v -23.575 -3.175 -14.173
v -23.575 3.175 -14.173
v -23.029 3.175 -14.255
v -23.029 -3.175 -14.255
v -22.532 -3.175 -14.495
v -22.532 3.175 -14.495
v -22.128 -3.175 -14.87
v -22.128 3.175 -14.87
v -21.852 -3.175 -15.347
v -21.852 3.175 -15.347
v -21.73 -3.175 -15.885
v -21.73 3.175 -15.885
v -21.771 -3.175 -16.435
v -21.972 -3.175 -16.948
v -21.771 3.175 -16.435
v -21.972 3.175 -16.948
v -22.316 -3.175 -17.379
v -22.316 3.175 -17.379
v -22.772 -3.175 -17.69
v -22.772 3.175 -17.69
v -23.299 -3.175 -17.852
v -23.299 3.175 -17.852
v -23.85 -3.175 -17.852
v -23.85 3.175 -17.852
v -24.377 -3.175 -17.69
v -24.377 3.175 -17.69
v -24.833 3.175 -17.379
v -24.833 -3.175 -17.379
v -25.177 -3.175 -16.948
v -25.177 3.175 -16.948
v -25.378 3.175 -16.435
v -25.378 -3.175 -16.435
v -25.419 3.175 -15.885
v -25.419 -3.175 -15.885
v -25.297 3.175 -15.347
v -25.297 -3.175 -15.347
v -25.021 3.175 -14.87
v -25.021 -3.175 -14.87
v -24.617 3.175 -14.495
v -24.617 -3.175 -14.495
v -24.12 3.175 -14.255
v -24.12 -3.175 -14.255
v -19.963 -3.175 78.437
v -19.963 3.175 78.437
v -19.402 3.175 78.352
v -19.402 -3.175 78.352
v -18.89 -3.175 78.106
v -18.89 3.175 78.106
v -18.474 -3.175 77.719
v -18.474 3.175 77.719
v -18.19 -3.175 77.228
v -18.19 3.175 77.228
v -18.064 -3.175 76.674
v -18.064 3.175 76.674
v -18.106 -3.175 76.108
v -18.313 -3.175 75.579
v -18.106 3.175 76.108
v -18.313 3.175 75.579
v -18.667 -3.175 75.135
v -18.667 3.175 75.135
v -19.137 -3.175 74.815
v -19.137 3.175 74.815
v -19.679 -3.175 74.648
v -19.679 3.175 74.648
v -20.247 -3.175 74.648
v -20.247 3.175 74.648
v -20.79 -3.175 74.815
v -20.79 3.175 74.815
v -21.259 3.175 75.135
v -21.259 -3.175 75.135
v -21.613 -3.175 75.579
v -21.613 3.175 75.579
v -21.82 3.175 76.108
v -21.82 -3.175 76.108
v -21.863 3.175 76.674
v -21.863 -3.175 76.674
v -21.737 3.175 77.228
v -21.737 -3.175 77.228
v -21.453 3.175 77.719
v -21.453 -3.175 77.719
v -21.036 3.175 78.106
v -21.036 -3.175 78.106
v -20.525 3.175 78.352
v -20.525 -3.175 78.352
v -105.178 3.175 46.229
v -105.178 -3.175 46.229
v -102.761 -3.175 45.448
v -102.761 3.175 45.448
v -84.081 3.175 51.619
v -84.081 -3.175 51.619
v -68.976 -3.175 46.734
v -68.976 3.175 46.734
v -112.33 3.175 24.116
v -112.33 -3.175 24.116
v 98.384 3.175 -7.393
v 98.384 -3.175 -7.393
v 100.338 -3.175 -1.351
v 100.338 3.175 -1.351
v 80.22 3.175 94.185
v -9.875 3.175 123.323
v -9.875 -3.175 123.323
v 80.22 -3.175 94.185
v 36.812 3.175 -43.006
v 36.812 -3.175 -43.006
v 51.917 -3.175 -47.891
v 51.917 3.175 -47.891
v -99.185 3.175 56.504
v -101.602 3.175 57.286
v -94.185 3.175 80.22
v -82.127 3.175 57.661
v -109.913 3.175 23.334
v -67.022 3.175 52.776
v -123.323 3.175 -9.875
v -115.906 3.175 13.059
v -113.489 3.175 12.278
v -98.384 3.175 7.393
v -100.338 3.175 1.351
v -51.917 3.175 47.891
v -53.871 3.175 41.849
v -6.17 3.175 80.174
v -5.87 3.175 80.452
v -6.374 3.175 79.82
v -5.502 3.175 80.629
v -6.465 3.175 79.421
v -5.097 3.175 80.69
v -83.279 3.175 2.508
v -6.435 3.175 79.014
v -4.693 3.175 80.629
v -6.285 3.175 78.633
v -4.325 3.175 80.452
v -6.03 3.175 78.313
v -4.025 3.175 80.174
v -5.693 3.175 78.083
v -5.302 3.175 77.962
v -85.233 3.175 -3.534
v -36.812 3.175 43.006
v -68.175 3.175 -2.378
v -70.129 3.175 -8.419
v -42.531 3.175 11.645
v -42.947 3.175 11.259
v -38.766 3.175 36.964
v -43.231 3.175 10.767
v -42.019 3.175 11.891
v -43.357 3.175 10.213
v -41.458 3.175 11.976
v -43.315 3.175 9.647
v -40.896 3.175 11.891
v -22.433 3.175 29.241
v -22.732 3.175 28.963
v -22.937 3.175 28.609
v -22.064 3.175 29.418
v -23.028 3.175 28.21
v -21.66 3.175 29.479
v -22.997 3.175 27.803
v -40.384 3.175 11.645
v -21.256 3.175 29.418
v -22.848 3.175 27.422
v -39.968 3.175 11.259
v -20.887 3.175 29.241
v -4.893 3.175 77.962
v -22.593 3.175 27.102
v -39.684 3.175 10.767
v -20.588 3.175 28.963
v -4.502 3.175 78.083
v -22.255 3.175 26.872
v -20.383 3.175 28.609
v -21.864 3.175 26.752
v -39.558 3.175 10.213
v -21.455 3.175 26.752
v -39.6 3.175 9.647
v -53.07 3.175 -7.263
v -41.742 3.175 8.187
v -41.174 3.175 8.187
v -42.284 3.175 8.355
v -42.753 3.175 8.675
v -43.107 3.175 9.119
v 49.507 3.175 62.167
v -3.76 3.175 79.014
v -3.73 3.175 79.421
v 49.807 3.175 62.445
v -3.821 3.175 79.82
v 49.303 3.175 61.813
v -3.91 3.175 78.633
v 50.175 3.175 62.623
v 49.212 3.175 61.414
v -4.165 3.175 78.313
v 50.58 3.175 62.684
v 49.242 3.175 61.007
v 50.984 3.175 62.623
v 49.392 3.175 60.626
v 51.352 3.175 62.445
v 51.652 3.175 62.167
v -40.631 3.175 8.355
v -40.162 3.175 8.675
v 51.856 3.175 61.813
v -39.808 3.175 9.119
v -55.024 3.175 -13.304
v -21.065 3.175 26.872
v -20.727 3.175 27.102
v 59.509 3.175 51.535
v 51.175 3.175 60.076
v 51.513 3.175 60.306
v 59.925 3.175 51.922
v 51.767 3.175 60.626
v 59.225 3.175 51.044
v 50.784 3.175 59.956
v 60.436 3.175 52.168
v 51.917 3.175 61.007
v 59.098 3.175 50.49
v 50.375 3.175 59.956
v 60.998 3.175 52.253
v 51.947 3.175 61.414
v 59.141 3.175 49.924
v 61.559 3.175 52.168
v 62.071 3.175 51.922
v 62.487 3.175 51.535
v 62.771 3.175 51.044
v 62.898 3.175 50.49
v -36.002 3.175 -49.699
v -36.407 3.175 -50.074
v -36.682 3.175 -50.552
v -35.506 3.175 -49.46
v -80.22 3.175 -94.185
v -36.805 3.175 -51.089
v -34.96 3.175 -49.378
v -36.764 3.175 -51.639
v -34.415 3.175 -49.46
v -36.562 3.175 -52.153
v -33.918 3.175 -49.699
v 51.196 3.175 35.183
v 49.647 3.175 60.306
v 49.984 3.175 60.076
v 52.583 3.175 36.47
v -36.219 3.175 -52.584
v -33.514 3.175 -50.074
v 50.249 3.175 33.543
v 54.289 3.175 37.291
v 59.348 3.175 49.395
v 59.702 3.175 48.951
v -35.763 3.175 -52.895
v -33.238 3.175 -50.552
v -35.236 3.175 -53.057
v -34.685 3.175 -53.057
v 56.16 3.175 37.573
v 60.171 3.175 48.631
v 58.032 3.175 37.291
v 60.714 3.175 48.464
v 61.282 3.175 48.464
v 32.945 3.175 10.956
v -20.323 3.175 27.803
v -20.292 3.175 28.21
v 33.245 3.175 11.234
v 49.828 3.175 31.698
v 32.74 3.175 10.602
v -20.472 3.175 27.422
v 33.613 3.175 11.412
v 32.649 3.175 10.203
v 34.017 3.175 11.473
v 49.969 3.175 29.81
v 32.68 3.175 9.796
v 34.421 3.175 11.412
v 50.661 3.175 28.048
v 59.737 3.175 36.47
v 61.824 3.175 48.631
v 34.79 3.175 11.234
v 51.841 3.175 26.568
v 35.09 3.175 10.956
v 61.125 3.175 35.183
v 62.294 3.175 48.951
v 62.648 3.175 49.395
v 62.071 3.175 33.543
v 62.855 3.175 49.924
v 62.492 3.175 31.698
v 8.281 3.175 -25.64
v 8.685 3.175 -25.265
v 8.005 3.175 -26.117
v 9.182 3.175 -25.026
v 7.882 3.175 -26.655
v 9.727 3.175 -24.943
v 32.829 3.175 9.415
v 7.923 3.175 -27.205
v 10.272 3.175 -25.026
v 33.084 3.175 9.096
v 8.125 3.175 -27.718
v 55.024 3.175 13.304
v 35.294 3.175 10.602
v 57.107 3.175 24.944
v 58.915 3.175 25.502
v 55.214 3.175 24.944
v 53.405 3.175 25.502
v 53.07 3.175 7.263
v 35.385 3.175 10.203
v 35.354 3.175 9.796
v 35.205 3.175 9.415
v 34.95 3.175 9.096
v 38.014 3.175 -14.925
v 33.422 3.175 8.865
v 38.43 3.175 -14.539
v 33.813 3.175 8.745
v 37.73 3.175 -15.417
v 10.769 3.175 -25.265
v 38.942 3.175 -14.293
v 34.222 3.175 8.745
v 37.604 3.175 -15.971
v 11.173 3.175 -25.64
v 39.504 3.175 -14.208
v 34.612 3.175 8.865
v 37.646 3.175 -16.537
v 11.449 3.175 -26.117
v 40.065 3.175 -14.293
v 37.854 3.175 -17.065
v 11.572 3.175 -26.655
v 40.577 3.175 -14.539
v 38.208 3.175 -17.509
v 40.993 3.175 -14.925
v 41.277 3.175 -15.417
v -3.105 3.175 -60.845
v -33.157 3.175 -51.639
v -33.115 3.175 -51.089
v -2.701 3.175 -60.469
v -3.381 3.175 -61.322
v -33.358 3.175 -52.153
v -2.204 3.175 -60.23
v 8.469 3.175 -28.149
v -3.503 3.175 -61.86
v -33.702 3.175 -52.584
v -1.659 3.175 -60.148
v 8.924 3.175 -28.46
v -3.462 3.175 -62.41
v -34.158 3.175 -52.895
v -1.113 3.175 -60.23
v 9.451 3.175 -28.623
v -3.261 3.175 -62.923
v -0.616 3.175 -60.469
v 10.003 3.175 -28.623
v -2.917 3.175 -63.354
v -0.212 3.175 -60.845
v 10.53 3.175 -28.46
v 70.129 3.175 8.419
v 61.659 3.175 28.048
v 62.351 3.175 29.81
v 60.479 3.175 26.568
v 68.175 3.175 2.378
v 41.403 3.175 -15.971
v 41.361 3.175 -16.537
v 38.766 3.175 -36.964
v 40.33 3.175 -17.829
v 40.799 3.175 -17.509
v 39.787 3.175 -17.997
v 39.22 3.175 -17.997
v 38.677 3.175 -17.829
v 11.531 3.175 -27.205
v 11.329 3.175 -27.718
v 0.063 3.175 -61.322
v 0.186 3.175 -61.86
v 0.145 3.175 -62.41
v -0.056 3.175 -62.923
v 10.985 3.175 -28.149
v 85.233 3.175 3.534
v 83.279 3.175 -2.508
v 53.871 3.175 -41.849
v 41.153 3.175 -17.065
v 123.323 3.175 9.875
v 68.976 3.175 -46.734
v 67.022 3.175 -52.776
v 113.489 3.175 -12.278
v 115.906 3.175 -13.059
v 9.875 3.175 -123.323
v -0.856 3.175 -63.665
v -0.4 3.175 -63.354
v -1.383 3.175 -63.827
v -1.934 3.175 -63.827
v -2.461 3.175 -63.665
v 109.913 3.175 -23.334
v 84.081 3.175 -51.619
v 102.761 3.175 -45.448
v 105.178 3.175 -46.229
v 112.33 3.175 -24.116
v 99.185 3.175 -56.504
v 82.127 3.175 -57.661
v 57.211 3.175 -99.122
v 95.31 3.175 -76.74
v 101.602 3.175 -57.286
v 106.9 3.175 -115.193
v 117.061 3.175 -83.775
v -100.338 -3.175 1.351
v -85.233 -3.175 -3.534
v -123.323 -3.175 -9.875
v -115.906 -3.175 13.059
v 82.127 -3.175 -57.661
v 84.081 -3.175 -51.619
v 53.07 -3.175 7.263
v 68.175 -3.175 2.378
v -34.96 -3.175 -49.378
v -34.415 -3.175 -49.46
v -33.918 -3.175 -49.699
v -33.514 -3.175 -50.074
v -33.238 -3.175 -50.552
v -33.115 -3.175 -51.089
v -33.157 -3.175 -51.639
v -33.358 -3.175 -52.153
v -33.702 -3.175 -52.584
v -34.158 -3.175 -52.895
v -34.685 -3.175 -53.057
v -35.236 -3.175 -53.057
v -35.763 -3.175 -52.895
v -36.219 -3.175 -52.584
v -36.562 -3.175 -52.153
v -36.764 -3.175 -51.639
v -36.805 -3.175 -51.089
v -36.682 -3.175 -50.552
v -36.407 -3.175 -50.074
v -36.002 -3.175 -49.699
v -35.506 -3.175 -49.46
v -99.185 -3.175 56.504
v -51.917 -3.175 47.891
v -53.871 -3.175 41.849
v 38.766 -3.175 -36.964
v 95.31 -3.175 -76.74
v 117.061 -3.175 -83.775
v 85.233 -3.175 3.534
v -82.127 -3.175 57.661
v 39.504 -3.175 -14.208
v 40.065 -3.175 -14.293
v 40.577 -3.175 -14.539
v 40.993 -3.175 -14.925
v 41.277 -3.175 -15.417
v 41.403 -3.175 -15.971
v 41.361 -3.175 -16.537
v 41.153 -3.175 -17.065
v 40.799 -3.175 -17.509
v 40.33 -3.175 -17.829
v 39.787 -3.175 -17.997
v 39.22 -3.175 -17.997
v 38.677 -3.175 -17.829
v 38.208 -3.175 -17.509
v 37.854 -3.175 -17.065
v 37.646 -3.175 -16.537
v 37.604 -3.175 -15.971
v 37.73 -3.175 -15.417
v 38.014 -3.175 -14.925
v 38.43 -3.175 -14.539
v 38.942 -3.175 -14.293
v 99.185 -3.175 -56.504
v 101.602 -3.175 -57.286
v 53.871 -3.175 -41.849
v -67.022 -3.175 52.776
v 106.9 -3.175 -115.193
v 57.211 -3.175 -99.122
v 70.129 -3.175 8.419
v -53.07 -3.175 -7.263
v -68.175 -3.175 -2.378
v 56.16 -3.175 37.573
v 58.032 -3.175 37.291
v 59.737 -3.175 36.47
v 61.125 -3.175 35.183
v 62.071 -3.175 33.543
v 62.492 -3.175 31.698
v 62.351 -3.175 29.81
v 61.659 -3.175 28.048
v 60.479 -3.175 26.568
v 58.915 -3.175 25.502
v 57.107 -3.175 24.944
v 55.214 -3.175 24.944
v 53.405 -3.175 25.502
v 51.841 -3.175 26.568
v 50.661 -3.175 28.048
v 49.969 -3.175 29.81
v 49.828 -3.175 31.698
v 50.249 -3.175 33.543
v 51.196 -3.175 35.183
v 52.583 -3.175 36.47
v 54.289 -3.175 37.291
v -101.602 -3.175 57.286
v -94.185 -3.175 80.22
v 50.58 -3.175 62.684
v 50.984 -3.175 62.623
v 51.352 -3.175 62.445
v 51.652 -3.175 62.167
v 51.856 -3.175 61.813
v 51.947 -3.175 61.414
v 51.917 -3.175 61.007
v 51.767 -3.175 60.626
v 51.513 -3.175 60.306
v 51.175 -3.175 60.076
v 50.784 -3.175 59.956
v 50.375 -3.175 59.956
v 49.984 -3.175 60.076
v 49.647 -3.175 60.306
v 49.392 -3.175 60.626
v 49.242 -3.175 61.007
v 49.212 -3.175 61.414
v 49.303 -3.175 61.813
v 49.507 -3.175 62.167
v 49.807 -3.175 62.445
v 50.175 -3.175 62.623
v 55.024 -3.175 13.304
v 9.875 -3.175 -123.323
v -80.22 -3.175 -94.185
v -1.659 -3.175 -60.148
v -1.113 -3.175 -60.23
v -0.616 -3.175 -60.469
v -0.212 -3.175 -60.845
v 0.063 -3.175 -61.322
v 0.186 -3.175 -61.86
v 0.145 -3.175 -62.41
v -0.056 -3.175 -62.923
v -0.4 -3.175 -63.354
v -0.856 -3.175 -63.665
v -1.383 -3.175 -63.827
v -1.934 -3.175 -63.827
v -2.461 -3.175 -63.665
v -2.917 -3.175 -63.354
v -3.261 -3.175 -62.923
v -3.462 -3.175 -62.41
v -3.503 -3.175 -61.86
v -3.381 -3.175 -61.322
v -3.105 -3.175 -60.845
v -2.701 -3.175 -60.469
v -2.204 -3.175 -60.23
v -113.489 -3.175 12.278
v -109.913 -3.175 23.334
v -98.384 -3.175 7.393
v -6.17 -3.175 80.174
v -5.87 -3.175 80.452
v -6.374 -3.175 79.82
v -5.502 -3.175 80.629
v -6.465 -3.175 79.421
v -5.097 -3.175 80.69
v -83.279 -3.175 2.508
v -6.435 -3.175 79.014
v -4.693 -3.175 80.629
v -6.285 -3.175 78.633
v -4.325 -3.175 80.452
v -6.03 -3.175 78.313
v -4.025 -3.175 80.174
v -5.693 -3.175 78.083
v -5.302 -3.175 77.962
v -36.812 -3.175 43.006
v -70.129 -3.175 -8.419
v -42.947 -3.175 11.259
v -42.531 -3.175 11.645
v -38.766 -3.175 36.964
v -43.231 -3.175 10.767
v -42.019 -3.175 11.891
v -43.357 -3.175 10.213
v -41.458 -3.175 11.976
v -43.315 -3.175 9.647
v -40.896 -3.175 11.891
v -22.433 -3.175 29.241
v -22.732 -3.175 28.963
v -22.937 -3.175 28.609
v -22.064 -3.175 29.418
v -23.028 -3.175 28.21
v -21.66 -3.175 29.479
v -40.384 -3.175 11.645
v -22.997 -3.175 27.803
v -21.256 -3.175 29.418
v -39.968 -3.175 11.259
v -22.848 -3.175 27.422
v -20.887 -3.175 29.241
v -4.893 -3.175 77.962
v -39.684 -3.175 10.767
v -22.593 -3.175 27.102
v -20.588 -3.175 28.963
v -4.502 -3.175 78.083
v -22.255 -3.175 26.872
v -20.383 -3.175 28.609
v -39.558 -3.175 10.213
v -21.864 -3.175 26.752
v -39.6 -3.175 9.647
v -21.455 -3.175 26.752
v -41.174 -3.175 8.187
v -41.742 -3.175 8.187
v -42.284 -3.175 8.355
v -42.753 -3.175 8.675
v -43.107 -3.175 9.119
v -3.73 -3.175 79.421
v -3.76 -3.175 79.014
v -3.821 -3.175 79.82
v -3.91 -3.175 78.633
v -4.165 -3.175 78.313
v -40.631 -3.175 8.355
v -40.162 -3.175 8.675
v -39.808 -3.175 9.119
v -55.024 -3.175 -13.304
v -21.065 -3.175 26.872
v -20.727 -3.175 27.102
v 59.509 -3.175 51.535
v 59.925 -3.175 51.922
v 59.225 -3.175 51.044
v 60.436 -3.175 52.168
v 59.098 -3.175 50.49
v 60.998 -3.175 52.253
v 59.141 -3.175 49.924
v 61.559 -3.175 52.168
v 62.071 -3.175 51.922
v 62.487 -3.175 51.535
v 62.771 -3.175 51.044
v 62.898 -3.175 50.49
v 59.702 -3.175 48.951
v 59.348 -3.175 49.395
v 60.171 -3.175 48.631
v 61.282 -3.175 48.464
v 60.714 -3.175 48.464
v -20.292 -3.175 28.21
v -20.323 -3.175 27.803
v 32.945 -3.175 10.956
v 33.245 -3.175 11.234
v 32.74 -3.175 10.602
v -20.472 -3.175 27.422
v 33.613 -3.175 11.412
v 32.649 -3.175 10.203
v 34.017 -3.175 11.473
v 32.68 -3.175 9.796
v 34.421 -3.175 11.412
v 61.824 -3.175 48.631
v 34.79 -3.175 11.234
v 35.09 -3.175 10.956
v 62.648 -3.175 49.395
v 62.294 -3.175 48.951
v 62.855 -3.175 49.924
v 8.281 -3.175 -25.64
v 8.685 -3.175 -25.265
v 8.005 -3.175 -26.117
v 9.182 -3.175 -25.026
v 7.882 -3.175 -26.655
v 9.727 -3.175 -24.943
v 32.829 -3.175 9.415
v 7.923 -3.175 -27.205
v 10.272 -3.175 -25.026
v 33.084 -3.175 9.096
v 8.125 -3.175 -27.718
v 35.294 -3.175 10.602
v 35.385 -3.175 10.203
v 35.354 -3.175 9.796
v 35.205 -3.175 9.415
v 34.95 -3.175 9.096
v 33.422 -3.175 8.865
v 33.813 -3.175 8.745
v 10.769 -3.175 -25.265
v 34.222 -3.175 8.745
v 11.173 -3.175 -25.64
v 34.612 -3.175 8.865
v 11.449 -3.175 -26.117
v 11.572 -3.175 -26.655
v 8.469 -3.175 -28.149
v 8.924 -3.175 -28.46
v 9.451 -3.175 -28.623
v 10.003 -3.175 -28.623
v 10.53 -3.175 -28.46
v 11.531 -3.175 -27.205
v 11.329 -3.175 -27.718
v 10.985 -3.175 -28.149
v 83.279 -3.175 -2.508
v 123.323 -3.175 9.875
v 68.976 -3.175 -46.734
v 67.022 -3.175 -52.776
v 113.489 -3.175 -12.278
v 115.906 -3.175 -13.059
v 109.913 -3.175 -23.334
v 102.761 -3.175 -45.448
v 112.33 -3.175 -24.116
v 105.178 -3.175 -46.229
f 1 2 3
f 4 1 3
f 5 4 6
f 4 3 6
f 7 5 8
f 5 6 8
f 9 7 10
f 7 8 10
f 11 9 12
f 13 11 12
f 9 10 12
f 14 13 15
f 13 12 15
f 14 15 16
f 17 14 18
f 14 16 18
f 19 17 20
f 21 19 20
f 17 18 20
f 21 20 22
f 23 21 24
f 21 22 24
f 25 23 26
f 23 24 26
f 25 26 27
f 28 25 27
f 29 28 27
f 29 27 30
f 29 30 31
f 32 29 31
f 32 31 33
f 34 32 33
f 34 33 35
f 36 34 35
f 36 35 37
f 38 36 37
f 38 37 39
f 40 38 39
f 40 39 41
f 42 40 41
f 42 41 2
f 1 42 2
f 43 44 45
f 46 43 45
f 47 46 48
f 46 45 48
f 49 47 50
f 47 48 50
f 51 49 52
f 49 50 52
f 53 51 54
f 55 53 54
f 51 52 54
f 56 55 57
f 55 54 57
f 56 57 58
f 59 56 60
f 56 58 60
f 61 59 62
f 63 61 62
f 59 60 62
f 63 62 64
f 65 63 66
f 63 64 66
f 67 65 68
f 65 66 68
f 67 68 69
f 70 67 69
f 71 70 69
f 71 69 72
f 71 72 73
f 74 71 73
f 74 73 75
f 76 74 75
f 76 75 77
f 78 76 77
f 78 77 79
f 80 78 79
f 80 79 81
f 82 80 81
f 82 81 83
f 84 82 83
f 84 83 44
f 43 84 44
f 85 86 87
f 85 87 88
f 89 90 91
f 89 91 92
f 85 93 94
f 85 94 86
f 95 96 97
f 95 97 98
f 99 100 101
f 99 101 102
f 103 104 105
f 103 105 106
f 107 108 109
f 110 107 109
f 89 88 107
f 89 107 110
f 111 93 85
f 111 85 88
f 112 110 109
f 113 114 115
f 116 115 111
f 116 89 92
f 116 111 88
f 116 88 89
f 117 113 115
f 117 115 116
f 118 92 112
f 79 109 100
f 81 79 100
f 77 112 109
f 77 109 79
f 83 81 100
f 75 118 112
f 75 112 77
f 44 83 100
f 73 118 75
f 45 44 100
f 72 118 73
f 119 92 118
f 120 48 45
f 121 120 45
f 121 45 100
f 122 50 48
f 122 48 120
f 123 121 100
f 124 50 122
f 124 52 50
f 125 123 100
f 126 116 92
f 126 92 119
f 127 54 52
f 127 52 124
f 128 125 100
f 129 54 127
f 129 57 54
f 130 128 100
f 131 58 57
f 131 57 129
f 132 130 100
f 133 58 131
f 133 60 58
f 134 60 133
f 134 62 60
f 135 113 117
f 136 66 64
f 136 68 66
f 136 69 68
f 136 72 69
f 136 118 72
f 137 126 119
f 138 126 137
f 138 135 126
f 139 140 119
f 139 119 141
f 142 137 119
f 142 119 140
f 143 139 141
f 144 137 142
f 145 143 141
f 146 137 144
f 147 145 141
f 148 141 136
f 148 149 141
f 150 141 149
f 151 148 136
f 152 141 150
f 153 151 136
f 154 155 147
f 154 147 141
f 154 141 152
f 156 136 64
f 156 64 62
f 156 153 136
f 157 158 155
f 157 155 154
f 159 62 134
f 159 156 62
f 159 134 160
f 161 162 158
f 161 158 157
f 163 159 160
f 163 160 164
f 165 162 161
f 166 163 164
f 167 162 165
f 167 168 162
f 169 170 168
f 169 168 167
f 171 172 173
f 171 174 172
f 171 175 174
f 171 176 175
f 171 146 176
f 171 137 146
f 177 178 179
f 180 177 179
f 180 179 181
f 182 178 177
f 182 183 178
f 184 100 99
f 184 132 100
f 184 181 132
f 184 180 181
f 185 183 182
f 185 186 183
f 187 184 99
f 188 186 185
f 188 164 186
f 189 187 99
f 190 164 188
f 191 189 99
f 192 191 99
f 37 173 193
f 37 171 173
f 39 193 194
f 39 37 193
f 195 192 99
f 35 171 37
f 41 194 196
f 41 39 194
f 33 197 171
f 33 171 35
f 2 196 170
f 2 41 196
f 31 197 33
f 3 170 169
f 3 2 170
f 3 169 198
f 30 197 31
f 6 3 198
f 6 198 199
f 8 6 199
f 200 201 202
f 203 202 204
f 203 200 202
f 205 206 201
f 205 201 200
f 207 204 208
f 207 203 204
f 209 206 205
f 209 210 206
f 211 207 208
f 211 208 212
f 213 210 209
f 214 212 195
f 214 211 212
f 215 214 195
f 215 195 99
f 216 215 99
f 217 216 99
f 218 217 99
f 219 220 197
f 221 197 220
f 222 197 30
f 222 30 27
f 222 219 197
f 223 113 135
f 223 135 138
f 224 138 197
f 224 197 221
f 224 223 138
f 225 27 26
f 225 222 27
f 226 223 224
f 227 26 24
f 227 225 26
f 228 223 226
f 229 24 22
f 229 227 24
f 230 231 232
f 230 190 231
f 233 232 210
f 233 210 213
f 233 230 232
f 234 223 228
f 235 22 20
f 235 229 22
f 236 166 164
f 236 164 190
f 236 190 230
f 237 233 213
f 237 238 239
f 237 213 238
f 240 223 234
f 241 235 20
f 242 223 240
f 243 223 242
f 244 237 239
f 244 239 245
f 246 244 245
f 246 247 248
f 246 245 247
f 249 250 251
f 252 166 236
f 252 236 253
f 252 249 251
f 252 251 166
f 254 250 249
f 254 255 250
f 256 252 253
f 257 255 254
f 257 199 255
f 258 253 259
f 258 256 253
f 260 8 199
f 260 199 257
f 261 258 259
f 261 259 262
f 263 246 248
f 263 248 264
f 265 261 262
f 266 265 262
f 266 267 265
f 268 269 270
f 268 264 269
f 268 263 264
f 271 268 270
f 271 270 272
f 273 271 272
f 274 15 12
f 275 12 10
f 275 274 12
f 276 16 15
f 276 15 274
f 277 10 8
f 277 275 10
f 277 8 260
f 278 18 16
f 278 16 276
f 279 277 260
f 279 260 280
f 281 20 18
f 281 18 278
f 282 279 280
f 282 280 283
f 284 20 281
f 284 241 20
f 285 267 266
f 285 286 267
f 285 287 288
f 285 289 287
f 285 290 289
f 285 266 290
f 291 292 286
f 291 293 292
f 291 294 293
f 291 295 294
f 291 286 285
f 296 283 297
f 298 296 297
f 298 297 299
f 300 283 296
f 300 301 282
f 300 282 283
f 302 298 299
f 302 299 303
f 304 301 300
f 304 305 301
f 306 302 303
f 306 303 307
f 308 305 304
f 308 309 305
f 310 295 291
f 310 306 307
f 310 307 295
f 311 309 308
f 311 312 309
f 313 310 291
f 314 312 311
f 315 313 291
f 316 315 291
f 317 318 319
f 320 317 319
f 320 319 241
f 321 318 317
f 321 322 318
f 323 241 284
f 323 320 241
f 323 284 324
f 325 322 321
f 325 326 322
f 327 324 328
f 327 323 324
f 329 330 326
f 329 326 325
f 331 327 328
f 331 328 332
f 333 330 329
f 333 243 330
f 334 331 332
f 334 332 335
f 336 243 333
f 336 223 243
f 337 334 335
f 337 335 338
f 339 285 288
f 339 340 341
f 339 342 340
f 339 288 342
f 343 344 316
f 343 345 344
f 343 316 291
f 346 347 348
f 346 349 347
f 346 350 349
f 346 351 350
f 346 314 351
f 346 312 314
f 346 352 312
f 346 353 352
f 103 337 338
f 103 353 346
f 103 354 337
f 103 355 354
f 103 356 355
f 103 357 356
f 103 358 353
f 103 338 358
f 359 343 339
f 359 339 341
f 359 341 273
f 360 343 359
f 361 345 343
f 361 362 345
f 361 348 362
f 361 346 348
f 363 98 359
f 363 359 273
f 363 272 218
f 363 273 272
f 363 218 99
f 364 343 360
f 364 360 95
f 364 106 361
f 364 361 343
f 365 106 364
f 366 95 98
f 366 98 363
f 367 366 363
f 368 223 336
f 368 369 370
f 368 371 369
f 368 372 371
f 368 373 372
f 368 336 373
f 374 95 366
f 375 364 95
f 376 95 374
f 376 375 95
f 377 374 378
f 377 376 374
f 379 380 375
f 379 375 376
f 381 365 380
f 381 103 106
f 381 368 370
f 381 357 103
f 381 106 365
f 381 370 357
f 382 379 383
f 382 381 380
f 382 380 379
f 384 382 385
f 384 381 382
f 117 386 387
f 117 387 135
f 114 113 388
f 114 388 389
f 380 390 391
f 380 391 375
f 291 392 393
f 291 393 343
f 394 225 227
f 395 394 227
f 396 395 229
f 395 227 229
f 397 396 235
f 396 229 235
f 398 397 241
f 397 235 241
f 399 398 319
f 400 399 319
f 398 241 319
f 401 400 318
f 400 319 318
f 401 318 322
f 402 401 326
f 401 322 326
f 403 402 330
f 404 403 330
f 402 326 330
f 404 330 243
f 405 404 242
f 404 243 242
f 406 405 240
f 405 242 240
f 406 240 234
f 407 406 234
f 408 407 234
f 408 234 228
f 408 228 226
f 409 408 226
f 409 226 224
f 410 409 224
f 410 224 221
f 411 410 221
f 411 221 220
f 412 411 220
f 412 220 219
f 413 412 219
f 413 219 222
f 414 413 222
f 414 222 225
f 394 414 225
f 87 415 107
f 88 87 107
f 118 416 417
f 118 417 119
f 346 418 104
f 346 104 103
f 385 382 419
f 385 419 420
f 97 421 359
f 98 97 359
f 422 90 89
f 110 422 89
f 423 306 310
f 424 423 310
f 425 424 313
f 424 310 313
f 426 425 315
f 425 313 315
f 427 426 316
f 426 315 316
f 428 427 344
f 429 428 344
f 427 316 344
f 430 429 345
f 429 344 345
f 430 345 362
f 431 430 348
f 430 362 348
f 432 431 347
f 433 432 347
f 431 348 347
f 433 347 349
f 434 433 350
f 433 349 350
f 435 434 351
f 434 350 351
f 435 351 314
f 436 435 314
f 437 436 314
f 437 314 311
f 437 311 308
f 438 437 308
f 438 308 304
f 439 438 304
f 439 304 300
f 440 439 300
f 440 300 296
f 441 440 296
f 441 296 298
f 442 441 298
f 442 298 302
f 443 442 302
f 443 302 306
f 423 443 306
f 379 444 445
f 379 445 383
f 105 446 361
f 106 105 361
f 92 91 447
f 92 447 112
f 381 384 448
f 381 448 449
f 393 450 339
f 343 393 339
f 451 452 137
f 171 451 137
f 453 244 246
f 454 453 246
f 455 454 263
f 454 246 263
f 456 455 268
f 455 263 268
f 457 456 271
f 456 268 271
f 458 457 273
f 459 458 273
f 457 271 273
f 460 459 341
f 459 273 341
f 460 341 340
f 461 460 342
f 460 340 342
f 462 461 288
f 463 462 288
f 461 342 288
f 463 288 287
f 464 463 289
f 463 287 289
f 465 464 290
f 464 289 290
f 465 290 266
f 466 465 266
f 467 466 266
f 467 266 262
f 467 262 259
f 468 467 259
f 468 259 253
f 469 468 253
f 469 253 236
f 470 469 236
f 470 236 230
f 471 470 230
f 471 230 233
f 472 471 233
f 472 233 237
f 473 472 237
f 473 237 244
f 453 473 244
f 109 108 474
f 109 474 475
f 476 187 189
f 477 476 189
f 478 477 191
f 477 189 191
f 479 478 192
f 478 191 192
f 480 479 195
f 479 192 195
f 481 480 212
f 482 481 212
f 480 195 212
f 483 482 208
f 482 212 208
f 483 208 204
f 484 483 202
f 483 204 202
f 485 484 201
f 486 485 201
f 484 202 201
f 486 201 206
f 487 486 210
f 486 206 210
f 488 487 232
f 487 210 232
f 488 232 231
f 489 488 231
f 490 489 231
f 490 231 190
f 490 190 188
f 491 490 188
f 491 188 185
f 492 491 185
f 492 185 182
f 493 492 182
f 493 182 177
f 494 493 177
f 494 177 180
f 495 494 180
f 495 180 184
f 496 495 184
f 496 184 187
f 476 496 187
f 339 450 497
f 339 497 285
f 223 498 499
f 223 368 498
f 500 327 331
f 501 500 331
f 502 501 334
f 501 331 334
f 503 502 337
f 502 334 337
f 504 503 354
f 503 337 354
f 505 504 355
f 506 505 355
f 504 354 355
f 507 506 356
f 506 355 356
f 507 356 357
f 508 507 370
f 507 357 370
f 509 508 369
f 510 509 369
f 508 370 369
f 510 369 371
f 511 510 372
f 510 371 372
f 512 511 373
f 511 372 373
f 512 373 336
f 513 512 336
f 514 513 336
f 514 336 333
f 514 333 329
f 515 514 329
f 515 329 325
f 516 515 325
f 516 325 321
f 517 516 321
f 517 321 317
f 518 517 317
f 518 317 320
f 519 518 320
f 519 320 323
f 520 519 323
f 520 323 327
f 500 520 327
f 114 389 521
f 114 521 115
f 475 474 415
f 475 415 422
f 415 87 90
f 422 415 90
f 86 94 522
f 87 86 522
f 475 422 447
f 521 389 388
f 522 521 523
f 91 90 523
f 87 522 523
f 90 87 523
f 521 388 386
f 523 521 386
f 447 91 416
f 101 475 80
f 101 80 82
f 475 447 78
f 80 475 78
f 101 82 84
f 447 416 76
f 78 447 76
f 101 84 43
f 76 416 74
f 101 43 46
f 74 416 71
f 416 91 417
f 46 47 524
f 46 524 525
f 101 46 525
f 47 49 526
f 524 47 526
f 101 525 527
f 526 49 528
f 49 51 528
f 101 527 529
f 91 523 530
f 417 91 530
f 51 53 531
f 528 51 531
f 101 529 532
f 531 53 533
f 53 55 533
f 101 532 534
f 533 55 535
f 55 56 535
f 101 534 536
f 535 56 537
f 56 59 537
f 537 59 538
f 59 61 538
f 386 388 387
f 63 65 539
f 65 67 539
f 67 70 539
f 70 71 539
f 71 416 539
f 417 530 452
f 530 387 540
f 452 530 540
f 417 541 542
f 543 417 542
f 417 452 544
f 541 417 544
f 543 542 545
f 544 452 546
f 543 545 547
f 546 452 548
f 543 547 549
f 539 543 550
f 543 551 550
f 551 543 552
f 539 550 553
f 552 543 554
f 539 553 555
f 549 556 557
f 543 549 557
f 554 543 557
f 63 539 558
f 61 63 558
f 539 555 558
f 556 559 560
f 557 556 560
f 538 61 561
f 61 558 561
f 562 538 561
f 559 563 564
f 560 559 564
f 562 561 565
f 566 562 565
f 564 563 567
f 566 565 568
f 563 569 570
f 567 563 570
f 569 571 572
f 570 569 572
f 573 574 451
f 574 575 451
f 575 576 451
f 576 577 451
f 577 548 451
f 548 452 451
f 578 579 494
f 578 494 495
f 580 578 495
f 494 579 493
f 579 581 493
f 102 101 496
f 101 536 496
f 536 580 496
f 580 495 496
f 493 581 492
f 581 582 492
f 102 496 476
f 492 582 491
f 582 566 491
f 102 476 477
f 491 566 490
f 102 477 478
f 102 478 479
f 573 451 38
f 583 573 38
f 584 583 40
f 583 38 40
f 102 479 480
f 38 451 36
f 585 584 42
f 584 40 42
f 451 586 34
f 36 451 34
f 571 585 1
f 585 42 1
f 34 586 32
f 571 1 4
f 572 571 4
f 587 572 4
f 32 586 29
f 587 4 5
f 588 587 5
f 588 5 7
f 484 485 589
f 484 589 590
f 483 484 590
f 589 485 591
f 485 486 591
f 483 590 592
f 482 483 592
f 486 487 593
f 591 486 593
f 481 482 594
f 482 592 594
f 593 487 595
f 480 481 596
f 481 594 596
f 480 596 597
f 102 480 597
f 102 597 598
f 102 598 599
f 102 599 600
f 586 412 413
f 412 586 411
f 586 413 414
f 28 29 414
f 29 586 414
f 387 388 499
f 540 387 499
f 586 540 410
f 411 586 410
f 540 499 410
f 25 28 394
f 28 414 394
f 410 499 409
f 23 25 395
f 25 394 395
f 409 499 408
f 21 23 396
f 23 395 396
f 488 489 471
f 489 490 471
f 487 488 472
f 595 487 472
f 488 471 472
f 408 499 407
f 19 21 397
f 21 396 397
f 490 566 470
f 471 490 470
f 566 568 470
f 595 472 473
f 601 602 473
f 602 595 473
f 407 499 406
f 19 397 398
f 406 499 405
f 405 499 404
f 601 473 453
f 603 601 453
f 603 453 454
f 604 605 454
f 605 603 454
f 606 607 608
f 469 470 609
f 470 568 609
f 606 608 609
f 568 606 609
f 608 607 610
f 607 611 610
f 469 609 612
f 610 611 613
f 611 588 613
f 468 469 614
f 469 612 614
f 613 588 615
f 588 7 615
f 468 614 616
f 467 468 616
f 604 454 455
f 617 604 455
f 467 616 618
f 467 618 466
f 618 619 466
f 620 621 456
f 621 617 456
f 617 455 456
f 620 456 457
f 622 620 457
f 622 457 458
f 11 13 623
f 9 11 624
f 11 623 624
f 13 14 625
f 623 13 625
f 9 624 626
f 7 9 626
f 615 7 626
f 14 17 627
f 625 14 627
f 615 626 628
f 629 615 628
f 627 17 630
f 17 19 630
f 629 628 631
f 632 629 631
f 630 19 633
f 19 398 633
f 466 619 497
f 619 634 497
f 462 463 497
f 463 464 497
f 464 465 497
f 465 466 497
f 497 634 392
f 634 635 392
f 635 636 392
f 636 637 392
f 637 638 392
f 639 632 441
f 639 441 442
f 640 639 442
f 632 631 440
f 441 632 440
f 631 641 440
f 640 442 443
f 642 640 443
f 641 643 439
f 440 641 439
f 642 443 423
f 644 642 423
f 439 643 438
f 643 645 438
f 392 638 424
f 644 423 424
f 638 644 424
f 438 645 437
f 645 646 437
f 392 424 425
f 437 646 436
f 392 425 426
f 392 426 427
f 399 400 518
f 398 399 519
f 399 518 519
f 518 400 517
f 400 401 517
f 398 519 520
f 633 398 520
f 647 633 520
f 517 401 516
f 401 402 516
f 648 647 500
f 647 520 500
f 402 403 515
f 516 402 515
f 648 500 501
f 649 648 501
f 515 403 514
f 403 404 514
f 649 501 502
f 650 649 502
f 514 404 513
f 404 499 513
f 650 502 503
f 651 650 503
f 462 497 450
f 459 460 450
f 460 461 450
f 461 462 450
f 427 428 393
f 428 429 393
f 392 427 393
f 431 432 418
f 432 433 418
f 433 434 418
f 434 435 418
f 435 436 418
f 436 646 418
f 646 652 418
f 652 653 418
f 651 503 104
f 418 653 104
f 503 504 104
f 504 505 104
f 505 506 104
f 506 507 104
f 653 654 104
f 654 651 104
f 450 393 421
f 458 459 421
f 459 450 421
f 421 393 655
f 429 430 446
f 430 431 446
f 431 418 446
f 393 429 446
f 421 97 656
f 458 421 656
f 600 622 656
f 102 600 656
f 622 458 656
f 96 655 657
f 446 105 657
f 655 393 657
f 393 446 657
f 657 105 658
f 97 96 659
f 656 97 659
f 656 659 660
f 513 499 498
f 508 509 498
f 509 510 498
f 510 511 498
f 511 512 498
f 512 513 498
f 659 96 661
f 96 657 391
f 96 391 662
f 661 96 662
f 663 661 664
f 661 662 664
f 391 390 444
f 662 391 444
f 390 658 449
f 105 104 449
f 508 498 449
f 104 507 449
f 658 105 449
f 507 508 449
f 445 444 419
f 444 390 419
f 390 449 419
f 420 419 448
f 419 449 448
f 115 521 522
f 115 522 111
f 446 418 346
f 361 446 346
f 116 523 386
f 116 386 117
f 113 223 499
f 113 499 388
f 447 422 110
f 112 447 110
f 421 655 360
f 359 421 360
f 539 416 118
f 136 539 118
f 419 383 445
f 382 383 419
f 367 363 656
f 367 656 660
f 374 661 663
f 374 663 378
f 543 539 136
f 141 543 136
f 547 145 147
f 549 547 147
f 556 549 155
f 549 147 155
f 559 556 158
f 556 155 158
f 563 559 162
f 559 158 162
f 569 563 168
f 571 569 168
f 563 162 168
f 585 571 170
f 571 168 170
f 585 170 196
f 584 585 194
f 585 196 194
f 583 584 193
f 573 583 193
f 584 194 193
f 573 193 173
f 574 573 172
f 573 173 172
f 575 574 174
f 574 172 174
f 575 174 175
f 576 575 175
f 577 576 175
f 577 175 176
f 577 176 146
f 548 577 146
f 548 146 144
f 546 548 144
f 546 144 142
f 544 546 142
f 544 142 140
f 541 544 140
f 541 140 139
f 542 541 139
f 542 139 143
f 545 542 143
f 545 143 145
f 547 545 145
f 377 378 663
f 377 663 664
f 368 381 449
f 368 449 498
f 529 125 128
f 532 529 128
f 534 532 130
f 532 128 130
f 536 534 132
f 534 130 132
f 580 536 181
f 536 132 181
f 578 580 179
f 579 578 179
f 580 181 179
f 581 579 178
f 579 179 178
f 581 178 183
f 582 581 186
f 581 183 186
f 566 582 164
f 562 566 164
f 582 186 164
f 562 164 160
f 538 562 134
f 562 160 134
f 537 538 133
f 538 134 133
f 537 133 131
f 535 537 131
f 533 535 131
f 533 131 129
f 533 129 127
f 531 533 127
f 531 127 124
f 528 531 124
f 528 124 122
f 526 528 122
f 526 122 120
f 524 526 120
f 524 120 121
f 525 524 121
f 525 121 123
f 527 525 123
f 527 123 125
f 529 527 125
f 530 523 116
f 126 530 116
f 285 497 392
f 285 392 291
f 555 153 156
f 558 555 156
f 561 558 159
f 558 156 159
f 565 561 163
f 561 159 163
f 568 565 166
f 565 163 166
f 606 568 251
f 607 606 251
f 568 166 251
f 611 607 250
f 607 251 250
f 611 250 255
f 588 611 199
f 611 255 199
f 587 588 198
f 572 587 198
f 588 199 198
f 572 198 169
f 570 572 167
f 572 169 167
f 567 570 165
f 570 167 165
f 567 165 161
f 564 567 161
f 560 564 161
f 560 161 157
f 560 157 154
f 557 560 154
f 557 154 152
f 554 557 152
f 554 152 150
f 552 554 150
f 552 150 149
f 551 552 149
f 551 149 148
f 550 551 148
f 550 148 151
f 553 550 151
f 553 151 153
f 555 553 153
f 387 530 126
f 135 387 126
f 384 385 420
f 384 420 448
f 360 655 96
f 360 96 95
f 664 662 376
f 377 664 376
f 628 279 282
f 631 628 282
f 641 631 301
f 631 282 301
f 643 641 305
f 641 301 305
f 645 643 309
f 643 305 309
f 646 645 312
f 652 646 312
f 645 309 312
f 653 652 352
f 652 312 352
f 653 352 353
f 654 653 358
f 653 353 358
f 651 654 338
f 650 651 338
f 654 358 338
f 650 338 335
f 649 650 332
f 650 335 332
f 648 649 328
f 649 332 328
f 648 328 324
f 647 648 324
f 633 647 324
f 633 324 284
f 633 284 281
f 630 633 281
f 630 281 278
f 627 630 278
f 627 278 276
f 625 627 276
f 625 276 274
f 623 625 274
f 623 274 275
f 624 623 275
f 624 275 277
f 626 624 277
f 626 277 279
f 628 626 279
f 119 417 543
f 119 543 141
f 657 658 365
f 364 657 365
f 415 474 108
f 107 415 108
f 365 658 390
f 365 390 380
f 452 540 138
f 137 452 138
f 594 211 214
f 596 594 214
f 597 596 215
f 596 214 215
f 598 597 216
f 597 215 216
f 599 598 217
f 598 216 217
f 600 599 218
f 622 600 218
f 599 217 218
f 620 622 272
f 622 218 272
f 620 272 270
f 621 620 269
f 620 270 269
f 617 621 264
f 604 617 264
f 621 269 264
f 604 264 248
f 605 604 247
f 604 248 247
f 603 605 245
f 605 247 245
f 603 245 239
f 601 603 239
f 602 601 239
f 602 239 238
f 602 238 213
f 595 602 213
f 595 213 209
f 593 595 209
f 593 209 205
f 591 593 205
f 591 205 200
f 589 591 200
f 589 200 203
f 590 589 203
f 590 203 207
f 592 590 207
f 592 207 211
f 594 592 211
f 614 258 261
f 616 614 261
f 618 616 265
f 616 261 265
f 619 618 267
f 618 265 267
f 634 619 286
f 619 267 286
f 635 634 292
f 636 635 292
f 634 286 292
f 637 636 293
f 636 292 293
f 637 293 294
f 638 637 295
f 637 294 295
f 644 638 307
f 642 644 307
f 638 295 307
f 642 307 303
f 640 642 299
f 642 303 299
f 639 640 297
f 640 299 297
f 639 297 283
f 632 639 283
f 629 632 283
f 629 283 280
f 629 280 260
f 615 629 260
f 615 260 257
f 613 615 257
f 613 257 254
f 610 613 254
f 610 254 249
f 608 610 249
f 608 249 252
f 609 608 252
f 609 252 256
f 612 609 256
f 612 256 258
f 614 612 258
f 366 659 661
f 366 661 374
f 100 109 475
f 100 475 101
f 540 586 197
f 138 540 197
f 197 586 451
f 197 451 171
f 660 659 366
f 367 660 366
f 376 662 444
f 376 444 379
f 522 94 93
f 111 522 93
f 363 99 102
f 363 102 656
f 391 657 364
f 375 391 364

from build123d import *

# Parameters (mm, degrees)
BOSS_EXTRUDE1_DEPTH = 3.175
BOSS_EXTRUDE2_DEPTH = 6.35
CAVITY2_START       = -95.885
CAVITY2_OUTLINE_W   = 6.35
CAVITY2_OUTLINE_H   = 6.35
CAVITY2_DEPTH       = 15.875
CAVITY2_START_2     = -64.135
CAVITY2_2_OUTLINE_W = 6.35
CAVITY2_2_OUTLINE_H = 6.35
CAVITY2_2_DEPTH     = 15.875
SKETCH6_R           = 1.3716
CUT_EXTRUDE1_DEPTH  = 175.52022504
SKETCH7_R           = 6.35
CUT_EXTRUDE2_DEPTH  = 175.52022504
SKETCH9_R           = 1.905
CUT_EXTRUDE3_DEPTH  = 175.52022504
SKETCH10_R          = 1.85
CUT_EXTRUDE4_DEPTH  = 175.52022504
CAVITY3_START       = 48.26
CAVITY3_OUTLINE_W   = 6.35
CAVITY3_OUTLINE_H   = 6.35
CAVITY3_DEPTH       = 15.875
CAVITY3_START_2     = 80.01
CAVITY3_2_OUTLINE_W = 6.35
CAVITY3_2_OUTLINE_H = 6.35
CAVITY3_2_DEPTH     = 15.875
CAVITY3_START_3     = -95.885
CAVITY3_3_OUTLINE_W = 6.35
CAVITY3_3_OUTLINE_H = 6.35
CAVITY3_3_DEPTH     = 15.875
CAVITY3_START_4     = -64.135
CAVITY3_4_OUTLINE_W = 6.35
CAVITY3_4_OUTLINE_H = 6.35
CAVITY3_4_DEPTH     = 15.875
CAVITY3_START_5     = -114.3
CAVITY3_5_OUTLINE_W = 6.35
CAVITY3_5_OUTLINE_H = 11.6205
CAVITY3_5_DEPTH     = 2.54
CAVITY3_START_6     = 111.76
CAVITY3_6_OUTLINE_W = 6.35
CAVITY3_6_OUTLINE_H = 11.6205
CAVITY3_6_DEPTH     = 2.54


# Read off the part's stored shape, not the designer's step: Cavity2, Cavity3
with BuildPart() as part:
    # Sketch1 → Boss-Extrude1 (new, symmetric)
    with BuildSketch(Plane(origin=(0, 0, 0), x_dir=(1, 0, 0), z_dir=(0, 1, 0))):
        Polygon((9.874658932, 123.322719821), (-80.219893167, 94.184769753), (-123.322719821, 9.874658932), (-94.184769753, -80.219893167), (-9.874658932, -123.322719821), (80.219893167, -94.184769753), (123.322719821, -9.874658932), (94.184769753, 80.219893167), align=None)
    extrude(amount=BOSS_EXTRUDE1_DEPTH, both=True)

    # Sketch3 → Boss-Extrude2 (add)
    with BuildSketch(Plane(origin=(0, 3.175, 0), x_dir=(1, 0, 0), z_dir=(0, 1, 0))):
        Polygon((95.310120051, 76.74030964), (117.060869008, 83.774833064), (106.89989073, 115.192581558), (57.210976805, 99.122430154), (94.184769753, 80.219893167), align=None)
    extrude(amount=-BOSS_EXTRUDE2_DEPTH)

    # Cavity2 outline → Cavity2 (cut)
    with BuildSketch(Plane(origin=(0, 0, 0), x_dir=(0, 1, 0), z_dir=(0.9514763323416664, 0, -0.3077219345344931)).offset(CAVITY2_START)):
        with Locations((0, 26.416)):
            Rectangle(CAVITY2_OUTLINE_W, CAVITY2_OUTLINE_H)
    extrude(amount=CAVITY2_DEPTH, mode=Mode.SUBTRACT)

    # Cavity2 2 outline → Cavity2 2 (cut)
    with BuildSketch(Plane(origin=(0, 0, 0), x_dir=(0, 1, 0), z_dir=(0.9514763323416664, 0, -0.3077219345344931)).offset(CAVITY2_START_2)):
        with Locations((0, 26.416)):
            Rectangle(CAVITY2_2_OUTLINE_W, CAVITY2_2_OUTLINE_H)
    extrude(amount=CAVITY2_2_DEPTH, mode=Mode.SUBTRACT)

    # Sketch6 → Cut-Extrude1 (cut, through all)
    with BuildSketch(Plane(origin=(0, 3.175, 0), x_dir=(1, 0, 0), z_dir=(0, 1, 0))):
        with Locations(Location((-5.097490915, -79.318746248, 0), (0, 0, 270))):
            Circle(SKETCH6_R)
        with Locations(Location((50.579592916, -61.311929511, 0), (0, 0, 270))):
            Circle(SKETCH6_R)
        with Locations(Location((34.017198322, -10.100999466, 0), (0, 0, 270))):
            Circle(SKETCH6_R)
        with Locations(Location((-21.659885509, -28.107816203, 0), (0, 0, 270))):
            Circle(SKETCH6_R)
    extrude(amount=-CUT_EXTRUDE1_DEPTH, mode=Mode.SUBTRACT)

    # Sketch7 → Cut-Extrude2 (cut, through all)
    with BuildSketch(Plane(origin=(0, 3.175, 0), x_dir=(1, 0, 0), z_dir=(0, 1, 0))):
        with Locations(Location((56.160215938, -31.223340716, 0), (0, 0, 270))):
            Circle(SKETCH7_R)
    extrude(amount=-CUT_EXTRUDE2_DEPTH, mode=Mode.SUBTRACT)

    # Sketch9 → Cut-Extrude3 (cut, through all)
    with BuildSketch(Plane(origin=(0, 3.175, 0), x_dir=(1, 0, 0), z_dir=(0, 1, 0))):
        with Locations(Location((-19.963200574, -76.531714164, 0), (0, 0, 270))):
            Circle(SKETCH9_R)
        with Locations(Location((-41.457577702, -10.07109235, 0), (0, 0, 270))):
            Circle(SKETCH9_R)
        with Locations(Location((60.997920545, -50.347654754, 0), (0, 0, 270))):
            Circle(SKETCH9_R)
        with Locations(Location((39.503543417, 16.11296706, 0), (0, 0, 270))):
            Circle(SKETCH9_R)
    extrude(amount=-CUT_EXTRUDE3_DEPTH, mode=Mode.SUBTRACT)

    # Sketch10 → Cut-Extrude4 (cut, through all)
    with BuildSketch(Plane(origin=(0, 3.175, 0), x_dir=(1, 0, 0), z_dir=(0, 1, 0))):
        with Locations(Location((-1.658619289, 61.997975629, 0), (0, 0, 270))):
            Circle(SKETCH10_R)
        with Locations(Location((-34.960290921, 51.22770792, 0), (0, 0, 270))):
            Circle(SKETCH10_R)
        with Locations(Location((-23.574579343, 16.023083623, 0), (0, 0, 270))):
            Circle(SKETCH10_R)
        with Locations(Location((9.727092289, 26.793351332, 0), (0, 0, 270))):
            Circle(SKETCH10_R)
    extrude(amount=-CUT_EXTRUDE4_DEPTH, mode=Mode.SUBTRACT)

    # Cavity3 outline → Cavity3 (cut)
    with BuildSketch(Plane(origin=(0, 0, 0), x_dir=(0, 1, 0), z_dir=(0.9514763323416664, 0, -0.3077219345344931)).offset(CAVITY3_START)):
        with Locations((0, 26.416)):
            Rectangle(CAVITY3_OUTLINE_W, CAVITY3_OUTLINE_H)
        with Locations((0, -26.416)):
            Rectangle(CAVITY3_OUTLINE_W, CAVITY3_OUTLINE_H)
    extrude(amount=CAVITY3_DEPTH, mode=Mode.SUBTRACT)

    # Cavity3 2 outline → Cavity3 2 (cut)
    with BuildSketch(Plane(origin=(0, 0, 0), x_dir=(0, 1, 0), z_dir=(0.9514763323416664, 0, -0.3077219345344931)).offset(CAVITY3_START_2)):
        with Locations((0, 26.416)):
            Rectangle(CAVITY3_2_OUTLINE_W, CAVITY3_2_OUTLINE_H)
        with Locations((0, -26.416)):
            Rectangle(CAVITY3_2_OUTLINE_W, CAVITY3_2_OUTLINE_H)
    extrude(amount=CAVITY3_2_DEPTH, mode=Mode.SUBTRACT)

    # Cavity3 3 outline → Cavity3 3 (cut)
    with BuildSketch(Plane(origin=(0, 0, 0), x_dir=(0, 1, 0), z_dir=(0.9514763323416664, 0, -0.3077219345344931)).offset(CAVITY3_START_3)):
        with Locations((0, -26.416)):
            Rectangle(CAVITY3_3_OUTLINE_W, CAVITY3_3_OUTLINE_H)
    extrude(amount=CAVITY3_3_DEPTH, mode=Mode.SUBTRACT)

    # Cavity3 4 outline → Cavity3 4 (cut)
    with BuildSketch(Plane(origin=(0, 0, 0), x_dir=(0, 1, 0), z_dir=(0.9514763323416664, 0, -0.3077219345344931)).offset(CAVITY3_START_4)):
        with Locations((0, -26.416)):
            Rectangle(CAVITY3_4_OUTLINE_W, CAVITY3_4_OUTLINE_H)
    extrude(amount=CAVITY3_4_DEPTH, mode=Mode.SUBTRACT)

    # Cavity3 5 outline → Cavity3 5 (cut)
    with BuildSketch(Plane(origin=(0, 0, 0), x_dir=(0, 1, 0), z_dir=(0.9514763323416664, 0, -0.3077219345344931)).offset(CAVITY3_START_5)):
        with Locations((0, 17.43075)):
            Rectangle(CAVITY3_5_OUTLINE_W, CAVITY3_5_OUTLINE_H)
        with Locations((0, -17.43075)):
            Rectangle(CAVITY3_5_OUTLINE_W, CAVITY3_5_OUTLINE_H)
    extrude(amount=CAVITY3_5_DEPTH, mode=Mode.SUBTRACT)

    # Cavity3 6 outline → Cavity3 6 (cut)
    with BuildSketch(Plane(origin=(0, 0, 0), x_dir=(0, 1, 0), z_dir=(0.9514763323416664, 0, -0.3077219345344931)).offset(CAVITY3_START_6)):
        with Locations((0, 17.43075)):
            Rectangle(CAVITY3_6_OUTLINE_W, CAVITY3_6_OUTLINE_H)
        with Locations((0, -17.43075)):
            Rectangle(CAVITY3_6_OUTLINE_W, CAVITY3_6_OUTLINE_H)
    extrude(amount=CAVITY3_6_DEPTH, mode=Mode.SUBTRACT)


solid = part.part
